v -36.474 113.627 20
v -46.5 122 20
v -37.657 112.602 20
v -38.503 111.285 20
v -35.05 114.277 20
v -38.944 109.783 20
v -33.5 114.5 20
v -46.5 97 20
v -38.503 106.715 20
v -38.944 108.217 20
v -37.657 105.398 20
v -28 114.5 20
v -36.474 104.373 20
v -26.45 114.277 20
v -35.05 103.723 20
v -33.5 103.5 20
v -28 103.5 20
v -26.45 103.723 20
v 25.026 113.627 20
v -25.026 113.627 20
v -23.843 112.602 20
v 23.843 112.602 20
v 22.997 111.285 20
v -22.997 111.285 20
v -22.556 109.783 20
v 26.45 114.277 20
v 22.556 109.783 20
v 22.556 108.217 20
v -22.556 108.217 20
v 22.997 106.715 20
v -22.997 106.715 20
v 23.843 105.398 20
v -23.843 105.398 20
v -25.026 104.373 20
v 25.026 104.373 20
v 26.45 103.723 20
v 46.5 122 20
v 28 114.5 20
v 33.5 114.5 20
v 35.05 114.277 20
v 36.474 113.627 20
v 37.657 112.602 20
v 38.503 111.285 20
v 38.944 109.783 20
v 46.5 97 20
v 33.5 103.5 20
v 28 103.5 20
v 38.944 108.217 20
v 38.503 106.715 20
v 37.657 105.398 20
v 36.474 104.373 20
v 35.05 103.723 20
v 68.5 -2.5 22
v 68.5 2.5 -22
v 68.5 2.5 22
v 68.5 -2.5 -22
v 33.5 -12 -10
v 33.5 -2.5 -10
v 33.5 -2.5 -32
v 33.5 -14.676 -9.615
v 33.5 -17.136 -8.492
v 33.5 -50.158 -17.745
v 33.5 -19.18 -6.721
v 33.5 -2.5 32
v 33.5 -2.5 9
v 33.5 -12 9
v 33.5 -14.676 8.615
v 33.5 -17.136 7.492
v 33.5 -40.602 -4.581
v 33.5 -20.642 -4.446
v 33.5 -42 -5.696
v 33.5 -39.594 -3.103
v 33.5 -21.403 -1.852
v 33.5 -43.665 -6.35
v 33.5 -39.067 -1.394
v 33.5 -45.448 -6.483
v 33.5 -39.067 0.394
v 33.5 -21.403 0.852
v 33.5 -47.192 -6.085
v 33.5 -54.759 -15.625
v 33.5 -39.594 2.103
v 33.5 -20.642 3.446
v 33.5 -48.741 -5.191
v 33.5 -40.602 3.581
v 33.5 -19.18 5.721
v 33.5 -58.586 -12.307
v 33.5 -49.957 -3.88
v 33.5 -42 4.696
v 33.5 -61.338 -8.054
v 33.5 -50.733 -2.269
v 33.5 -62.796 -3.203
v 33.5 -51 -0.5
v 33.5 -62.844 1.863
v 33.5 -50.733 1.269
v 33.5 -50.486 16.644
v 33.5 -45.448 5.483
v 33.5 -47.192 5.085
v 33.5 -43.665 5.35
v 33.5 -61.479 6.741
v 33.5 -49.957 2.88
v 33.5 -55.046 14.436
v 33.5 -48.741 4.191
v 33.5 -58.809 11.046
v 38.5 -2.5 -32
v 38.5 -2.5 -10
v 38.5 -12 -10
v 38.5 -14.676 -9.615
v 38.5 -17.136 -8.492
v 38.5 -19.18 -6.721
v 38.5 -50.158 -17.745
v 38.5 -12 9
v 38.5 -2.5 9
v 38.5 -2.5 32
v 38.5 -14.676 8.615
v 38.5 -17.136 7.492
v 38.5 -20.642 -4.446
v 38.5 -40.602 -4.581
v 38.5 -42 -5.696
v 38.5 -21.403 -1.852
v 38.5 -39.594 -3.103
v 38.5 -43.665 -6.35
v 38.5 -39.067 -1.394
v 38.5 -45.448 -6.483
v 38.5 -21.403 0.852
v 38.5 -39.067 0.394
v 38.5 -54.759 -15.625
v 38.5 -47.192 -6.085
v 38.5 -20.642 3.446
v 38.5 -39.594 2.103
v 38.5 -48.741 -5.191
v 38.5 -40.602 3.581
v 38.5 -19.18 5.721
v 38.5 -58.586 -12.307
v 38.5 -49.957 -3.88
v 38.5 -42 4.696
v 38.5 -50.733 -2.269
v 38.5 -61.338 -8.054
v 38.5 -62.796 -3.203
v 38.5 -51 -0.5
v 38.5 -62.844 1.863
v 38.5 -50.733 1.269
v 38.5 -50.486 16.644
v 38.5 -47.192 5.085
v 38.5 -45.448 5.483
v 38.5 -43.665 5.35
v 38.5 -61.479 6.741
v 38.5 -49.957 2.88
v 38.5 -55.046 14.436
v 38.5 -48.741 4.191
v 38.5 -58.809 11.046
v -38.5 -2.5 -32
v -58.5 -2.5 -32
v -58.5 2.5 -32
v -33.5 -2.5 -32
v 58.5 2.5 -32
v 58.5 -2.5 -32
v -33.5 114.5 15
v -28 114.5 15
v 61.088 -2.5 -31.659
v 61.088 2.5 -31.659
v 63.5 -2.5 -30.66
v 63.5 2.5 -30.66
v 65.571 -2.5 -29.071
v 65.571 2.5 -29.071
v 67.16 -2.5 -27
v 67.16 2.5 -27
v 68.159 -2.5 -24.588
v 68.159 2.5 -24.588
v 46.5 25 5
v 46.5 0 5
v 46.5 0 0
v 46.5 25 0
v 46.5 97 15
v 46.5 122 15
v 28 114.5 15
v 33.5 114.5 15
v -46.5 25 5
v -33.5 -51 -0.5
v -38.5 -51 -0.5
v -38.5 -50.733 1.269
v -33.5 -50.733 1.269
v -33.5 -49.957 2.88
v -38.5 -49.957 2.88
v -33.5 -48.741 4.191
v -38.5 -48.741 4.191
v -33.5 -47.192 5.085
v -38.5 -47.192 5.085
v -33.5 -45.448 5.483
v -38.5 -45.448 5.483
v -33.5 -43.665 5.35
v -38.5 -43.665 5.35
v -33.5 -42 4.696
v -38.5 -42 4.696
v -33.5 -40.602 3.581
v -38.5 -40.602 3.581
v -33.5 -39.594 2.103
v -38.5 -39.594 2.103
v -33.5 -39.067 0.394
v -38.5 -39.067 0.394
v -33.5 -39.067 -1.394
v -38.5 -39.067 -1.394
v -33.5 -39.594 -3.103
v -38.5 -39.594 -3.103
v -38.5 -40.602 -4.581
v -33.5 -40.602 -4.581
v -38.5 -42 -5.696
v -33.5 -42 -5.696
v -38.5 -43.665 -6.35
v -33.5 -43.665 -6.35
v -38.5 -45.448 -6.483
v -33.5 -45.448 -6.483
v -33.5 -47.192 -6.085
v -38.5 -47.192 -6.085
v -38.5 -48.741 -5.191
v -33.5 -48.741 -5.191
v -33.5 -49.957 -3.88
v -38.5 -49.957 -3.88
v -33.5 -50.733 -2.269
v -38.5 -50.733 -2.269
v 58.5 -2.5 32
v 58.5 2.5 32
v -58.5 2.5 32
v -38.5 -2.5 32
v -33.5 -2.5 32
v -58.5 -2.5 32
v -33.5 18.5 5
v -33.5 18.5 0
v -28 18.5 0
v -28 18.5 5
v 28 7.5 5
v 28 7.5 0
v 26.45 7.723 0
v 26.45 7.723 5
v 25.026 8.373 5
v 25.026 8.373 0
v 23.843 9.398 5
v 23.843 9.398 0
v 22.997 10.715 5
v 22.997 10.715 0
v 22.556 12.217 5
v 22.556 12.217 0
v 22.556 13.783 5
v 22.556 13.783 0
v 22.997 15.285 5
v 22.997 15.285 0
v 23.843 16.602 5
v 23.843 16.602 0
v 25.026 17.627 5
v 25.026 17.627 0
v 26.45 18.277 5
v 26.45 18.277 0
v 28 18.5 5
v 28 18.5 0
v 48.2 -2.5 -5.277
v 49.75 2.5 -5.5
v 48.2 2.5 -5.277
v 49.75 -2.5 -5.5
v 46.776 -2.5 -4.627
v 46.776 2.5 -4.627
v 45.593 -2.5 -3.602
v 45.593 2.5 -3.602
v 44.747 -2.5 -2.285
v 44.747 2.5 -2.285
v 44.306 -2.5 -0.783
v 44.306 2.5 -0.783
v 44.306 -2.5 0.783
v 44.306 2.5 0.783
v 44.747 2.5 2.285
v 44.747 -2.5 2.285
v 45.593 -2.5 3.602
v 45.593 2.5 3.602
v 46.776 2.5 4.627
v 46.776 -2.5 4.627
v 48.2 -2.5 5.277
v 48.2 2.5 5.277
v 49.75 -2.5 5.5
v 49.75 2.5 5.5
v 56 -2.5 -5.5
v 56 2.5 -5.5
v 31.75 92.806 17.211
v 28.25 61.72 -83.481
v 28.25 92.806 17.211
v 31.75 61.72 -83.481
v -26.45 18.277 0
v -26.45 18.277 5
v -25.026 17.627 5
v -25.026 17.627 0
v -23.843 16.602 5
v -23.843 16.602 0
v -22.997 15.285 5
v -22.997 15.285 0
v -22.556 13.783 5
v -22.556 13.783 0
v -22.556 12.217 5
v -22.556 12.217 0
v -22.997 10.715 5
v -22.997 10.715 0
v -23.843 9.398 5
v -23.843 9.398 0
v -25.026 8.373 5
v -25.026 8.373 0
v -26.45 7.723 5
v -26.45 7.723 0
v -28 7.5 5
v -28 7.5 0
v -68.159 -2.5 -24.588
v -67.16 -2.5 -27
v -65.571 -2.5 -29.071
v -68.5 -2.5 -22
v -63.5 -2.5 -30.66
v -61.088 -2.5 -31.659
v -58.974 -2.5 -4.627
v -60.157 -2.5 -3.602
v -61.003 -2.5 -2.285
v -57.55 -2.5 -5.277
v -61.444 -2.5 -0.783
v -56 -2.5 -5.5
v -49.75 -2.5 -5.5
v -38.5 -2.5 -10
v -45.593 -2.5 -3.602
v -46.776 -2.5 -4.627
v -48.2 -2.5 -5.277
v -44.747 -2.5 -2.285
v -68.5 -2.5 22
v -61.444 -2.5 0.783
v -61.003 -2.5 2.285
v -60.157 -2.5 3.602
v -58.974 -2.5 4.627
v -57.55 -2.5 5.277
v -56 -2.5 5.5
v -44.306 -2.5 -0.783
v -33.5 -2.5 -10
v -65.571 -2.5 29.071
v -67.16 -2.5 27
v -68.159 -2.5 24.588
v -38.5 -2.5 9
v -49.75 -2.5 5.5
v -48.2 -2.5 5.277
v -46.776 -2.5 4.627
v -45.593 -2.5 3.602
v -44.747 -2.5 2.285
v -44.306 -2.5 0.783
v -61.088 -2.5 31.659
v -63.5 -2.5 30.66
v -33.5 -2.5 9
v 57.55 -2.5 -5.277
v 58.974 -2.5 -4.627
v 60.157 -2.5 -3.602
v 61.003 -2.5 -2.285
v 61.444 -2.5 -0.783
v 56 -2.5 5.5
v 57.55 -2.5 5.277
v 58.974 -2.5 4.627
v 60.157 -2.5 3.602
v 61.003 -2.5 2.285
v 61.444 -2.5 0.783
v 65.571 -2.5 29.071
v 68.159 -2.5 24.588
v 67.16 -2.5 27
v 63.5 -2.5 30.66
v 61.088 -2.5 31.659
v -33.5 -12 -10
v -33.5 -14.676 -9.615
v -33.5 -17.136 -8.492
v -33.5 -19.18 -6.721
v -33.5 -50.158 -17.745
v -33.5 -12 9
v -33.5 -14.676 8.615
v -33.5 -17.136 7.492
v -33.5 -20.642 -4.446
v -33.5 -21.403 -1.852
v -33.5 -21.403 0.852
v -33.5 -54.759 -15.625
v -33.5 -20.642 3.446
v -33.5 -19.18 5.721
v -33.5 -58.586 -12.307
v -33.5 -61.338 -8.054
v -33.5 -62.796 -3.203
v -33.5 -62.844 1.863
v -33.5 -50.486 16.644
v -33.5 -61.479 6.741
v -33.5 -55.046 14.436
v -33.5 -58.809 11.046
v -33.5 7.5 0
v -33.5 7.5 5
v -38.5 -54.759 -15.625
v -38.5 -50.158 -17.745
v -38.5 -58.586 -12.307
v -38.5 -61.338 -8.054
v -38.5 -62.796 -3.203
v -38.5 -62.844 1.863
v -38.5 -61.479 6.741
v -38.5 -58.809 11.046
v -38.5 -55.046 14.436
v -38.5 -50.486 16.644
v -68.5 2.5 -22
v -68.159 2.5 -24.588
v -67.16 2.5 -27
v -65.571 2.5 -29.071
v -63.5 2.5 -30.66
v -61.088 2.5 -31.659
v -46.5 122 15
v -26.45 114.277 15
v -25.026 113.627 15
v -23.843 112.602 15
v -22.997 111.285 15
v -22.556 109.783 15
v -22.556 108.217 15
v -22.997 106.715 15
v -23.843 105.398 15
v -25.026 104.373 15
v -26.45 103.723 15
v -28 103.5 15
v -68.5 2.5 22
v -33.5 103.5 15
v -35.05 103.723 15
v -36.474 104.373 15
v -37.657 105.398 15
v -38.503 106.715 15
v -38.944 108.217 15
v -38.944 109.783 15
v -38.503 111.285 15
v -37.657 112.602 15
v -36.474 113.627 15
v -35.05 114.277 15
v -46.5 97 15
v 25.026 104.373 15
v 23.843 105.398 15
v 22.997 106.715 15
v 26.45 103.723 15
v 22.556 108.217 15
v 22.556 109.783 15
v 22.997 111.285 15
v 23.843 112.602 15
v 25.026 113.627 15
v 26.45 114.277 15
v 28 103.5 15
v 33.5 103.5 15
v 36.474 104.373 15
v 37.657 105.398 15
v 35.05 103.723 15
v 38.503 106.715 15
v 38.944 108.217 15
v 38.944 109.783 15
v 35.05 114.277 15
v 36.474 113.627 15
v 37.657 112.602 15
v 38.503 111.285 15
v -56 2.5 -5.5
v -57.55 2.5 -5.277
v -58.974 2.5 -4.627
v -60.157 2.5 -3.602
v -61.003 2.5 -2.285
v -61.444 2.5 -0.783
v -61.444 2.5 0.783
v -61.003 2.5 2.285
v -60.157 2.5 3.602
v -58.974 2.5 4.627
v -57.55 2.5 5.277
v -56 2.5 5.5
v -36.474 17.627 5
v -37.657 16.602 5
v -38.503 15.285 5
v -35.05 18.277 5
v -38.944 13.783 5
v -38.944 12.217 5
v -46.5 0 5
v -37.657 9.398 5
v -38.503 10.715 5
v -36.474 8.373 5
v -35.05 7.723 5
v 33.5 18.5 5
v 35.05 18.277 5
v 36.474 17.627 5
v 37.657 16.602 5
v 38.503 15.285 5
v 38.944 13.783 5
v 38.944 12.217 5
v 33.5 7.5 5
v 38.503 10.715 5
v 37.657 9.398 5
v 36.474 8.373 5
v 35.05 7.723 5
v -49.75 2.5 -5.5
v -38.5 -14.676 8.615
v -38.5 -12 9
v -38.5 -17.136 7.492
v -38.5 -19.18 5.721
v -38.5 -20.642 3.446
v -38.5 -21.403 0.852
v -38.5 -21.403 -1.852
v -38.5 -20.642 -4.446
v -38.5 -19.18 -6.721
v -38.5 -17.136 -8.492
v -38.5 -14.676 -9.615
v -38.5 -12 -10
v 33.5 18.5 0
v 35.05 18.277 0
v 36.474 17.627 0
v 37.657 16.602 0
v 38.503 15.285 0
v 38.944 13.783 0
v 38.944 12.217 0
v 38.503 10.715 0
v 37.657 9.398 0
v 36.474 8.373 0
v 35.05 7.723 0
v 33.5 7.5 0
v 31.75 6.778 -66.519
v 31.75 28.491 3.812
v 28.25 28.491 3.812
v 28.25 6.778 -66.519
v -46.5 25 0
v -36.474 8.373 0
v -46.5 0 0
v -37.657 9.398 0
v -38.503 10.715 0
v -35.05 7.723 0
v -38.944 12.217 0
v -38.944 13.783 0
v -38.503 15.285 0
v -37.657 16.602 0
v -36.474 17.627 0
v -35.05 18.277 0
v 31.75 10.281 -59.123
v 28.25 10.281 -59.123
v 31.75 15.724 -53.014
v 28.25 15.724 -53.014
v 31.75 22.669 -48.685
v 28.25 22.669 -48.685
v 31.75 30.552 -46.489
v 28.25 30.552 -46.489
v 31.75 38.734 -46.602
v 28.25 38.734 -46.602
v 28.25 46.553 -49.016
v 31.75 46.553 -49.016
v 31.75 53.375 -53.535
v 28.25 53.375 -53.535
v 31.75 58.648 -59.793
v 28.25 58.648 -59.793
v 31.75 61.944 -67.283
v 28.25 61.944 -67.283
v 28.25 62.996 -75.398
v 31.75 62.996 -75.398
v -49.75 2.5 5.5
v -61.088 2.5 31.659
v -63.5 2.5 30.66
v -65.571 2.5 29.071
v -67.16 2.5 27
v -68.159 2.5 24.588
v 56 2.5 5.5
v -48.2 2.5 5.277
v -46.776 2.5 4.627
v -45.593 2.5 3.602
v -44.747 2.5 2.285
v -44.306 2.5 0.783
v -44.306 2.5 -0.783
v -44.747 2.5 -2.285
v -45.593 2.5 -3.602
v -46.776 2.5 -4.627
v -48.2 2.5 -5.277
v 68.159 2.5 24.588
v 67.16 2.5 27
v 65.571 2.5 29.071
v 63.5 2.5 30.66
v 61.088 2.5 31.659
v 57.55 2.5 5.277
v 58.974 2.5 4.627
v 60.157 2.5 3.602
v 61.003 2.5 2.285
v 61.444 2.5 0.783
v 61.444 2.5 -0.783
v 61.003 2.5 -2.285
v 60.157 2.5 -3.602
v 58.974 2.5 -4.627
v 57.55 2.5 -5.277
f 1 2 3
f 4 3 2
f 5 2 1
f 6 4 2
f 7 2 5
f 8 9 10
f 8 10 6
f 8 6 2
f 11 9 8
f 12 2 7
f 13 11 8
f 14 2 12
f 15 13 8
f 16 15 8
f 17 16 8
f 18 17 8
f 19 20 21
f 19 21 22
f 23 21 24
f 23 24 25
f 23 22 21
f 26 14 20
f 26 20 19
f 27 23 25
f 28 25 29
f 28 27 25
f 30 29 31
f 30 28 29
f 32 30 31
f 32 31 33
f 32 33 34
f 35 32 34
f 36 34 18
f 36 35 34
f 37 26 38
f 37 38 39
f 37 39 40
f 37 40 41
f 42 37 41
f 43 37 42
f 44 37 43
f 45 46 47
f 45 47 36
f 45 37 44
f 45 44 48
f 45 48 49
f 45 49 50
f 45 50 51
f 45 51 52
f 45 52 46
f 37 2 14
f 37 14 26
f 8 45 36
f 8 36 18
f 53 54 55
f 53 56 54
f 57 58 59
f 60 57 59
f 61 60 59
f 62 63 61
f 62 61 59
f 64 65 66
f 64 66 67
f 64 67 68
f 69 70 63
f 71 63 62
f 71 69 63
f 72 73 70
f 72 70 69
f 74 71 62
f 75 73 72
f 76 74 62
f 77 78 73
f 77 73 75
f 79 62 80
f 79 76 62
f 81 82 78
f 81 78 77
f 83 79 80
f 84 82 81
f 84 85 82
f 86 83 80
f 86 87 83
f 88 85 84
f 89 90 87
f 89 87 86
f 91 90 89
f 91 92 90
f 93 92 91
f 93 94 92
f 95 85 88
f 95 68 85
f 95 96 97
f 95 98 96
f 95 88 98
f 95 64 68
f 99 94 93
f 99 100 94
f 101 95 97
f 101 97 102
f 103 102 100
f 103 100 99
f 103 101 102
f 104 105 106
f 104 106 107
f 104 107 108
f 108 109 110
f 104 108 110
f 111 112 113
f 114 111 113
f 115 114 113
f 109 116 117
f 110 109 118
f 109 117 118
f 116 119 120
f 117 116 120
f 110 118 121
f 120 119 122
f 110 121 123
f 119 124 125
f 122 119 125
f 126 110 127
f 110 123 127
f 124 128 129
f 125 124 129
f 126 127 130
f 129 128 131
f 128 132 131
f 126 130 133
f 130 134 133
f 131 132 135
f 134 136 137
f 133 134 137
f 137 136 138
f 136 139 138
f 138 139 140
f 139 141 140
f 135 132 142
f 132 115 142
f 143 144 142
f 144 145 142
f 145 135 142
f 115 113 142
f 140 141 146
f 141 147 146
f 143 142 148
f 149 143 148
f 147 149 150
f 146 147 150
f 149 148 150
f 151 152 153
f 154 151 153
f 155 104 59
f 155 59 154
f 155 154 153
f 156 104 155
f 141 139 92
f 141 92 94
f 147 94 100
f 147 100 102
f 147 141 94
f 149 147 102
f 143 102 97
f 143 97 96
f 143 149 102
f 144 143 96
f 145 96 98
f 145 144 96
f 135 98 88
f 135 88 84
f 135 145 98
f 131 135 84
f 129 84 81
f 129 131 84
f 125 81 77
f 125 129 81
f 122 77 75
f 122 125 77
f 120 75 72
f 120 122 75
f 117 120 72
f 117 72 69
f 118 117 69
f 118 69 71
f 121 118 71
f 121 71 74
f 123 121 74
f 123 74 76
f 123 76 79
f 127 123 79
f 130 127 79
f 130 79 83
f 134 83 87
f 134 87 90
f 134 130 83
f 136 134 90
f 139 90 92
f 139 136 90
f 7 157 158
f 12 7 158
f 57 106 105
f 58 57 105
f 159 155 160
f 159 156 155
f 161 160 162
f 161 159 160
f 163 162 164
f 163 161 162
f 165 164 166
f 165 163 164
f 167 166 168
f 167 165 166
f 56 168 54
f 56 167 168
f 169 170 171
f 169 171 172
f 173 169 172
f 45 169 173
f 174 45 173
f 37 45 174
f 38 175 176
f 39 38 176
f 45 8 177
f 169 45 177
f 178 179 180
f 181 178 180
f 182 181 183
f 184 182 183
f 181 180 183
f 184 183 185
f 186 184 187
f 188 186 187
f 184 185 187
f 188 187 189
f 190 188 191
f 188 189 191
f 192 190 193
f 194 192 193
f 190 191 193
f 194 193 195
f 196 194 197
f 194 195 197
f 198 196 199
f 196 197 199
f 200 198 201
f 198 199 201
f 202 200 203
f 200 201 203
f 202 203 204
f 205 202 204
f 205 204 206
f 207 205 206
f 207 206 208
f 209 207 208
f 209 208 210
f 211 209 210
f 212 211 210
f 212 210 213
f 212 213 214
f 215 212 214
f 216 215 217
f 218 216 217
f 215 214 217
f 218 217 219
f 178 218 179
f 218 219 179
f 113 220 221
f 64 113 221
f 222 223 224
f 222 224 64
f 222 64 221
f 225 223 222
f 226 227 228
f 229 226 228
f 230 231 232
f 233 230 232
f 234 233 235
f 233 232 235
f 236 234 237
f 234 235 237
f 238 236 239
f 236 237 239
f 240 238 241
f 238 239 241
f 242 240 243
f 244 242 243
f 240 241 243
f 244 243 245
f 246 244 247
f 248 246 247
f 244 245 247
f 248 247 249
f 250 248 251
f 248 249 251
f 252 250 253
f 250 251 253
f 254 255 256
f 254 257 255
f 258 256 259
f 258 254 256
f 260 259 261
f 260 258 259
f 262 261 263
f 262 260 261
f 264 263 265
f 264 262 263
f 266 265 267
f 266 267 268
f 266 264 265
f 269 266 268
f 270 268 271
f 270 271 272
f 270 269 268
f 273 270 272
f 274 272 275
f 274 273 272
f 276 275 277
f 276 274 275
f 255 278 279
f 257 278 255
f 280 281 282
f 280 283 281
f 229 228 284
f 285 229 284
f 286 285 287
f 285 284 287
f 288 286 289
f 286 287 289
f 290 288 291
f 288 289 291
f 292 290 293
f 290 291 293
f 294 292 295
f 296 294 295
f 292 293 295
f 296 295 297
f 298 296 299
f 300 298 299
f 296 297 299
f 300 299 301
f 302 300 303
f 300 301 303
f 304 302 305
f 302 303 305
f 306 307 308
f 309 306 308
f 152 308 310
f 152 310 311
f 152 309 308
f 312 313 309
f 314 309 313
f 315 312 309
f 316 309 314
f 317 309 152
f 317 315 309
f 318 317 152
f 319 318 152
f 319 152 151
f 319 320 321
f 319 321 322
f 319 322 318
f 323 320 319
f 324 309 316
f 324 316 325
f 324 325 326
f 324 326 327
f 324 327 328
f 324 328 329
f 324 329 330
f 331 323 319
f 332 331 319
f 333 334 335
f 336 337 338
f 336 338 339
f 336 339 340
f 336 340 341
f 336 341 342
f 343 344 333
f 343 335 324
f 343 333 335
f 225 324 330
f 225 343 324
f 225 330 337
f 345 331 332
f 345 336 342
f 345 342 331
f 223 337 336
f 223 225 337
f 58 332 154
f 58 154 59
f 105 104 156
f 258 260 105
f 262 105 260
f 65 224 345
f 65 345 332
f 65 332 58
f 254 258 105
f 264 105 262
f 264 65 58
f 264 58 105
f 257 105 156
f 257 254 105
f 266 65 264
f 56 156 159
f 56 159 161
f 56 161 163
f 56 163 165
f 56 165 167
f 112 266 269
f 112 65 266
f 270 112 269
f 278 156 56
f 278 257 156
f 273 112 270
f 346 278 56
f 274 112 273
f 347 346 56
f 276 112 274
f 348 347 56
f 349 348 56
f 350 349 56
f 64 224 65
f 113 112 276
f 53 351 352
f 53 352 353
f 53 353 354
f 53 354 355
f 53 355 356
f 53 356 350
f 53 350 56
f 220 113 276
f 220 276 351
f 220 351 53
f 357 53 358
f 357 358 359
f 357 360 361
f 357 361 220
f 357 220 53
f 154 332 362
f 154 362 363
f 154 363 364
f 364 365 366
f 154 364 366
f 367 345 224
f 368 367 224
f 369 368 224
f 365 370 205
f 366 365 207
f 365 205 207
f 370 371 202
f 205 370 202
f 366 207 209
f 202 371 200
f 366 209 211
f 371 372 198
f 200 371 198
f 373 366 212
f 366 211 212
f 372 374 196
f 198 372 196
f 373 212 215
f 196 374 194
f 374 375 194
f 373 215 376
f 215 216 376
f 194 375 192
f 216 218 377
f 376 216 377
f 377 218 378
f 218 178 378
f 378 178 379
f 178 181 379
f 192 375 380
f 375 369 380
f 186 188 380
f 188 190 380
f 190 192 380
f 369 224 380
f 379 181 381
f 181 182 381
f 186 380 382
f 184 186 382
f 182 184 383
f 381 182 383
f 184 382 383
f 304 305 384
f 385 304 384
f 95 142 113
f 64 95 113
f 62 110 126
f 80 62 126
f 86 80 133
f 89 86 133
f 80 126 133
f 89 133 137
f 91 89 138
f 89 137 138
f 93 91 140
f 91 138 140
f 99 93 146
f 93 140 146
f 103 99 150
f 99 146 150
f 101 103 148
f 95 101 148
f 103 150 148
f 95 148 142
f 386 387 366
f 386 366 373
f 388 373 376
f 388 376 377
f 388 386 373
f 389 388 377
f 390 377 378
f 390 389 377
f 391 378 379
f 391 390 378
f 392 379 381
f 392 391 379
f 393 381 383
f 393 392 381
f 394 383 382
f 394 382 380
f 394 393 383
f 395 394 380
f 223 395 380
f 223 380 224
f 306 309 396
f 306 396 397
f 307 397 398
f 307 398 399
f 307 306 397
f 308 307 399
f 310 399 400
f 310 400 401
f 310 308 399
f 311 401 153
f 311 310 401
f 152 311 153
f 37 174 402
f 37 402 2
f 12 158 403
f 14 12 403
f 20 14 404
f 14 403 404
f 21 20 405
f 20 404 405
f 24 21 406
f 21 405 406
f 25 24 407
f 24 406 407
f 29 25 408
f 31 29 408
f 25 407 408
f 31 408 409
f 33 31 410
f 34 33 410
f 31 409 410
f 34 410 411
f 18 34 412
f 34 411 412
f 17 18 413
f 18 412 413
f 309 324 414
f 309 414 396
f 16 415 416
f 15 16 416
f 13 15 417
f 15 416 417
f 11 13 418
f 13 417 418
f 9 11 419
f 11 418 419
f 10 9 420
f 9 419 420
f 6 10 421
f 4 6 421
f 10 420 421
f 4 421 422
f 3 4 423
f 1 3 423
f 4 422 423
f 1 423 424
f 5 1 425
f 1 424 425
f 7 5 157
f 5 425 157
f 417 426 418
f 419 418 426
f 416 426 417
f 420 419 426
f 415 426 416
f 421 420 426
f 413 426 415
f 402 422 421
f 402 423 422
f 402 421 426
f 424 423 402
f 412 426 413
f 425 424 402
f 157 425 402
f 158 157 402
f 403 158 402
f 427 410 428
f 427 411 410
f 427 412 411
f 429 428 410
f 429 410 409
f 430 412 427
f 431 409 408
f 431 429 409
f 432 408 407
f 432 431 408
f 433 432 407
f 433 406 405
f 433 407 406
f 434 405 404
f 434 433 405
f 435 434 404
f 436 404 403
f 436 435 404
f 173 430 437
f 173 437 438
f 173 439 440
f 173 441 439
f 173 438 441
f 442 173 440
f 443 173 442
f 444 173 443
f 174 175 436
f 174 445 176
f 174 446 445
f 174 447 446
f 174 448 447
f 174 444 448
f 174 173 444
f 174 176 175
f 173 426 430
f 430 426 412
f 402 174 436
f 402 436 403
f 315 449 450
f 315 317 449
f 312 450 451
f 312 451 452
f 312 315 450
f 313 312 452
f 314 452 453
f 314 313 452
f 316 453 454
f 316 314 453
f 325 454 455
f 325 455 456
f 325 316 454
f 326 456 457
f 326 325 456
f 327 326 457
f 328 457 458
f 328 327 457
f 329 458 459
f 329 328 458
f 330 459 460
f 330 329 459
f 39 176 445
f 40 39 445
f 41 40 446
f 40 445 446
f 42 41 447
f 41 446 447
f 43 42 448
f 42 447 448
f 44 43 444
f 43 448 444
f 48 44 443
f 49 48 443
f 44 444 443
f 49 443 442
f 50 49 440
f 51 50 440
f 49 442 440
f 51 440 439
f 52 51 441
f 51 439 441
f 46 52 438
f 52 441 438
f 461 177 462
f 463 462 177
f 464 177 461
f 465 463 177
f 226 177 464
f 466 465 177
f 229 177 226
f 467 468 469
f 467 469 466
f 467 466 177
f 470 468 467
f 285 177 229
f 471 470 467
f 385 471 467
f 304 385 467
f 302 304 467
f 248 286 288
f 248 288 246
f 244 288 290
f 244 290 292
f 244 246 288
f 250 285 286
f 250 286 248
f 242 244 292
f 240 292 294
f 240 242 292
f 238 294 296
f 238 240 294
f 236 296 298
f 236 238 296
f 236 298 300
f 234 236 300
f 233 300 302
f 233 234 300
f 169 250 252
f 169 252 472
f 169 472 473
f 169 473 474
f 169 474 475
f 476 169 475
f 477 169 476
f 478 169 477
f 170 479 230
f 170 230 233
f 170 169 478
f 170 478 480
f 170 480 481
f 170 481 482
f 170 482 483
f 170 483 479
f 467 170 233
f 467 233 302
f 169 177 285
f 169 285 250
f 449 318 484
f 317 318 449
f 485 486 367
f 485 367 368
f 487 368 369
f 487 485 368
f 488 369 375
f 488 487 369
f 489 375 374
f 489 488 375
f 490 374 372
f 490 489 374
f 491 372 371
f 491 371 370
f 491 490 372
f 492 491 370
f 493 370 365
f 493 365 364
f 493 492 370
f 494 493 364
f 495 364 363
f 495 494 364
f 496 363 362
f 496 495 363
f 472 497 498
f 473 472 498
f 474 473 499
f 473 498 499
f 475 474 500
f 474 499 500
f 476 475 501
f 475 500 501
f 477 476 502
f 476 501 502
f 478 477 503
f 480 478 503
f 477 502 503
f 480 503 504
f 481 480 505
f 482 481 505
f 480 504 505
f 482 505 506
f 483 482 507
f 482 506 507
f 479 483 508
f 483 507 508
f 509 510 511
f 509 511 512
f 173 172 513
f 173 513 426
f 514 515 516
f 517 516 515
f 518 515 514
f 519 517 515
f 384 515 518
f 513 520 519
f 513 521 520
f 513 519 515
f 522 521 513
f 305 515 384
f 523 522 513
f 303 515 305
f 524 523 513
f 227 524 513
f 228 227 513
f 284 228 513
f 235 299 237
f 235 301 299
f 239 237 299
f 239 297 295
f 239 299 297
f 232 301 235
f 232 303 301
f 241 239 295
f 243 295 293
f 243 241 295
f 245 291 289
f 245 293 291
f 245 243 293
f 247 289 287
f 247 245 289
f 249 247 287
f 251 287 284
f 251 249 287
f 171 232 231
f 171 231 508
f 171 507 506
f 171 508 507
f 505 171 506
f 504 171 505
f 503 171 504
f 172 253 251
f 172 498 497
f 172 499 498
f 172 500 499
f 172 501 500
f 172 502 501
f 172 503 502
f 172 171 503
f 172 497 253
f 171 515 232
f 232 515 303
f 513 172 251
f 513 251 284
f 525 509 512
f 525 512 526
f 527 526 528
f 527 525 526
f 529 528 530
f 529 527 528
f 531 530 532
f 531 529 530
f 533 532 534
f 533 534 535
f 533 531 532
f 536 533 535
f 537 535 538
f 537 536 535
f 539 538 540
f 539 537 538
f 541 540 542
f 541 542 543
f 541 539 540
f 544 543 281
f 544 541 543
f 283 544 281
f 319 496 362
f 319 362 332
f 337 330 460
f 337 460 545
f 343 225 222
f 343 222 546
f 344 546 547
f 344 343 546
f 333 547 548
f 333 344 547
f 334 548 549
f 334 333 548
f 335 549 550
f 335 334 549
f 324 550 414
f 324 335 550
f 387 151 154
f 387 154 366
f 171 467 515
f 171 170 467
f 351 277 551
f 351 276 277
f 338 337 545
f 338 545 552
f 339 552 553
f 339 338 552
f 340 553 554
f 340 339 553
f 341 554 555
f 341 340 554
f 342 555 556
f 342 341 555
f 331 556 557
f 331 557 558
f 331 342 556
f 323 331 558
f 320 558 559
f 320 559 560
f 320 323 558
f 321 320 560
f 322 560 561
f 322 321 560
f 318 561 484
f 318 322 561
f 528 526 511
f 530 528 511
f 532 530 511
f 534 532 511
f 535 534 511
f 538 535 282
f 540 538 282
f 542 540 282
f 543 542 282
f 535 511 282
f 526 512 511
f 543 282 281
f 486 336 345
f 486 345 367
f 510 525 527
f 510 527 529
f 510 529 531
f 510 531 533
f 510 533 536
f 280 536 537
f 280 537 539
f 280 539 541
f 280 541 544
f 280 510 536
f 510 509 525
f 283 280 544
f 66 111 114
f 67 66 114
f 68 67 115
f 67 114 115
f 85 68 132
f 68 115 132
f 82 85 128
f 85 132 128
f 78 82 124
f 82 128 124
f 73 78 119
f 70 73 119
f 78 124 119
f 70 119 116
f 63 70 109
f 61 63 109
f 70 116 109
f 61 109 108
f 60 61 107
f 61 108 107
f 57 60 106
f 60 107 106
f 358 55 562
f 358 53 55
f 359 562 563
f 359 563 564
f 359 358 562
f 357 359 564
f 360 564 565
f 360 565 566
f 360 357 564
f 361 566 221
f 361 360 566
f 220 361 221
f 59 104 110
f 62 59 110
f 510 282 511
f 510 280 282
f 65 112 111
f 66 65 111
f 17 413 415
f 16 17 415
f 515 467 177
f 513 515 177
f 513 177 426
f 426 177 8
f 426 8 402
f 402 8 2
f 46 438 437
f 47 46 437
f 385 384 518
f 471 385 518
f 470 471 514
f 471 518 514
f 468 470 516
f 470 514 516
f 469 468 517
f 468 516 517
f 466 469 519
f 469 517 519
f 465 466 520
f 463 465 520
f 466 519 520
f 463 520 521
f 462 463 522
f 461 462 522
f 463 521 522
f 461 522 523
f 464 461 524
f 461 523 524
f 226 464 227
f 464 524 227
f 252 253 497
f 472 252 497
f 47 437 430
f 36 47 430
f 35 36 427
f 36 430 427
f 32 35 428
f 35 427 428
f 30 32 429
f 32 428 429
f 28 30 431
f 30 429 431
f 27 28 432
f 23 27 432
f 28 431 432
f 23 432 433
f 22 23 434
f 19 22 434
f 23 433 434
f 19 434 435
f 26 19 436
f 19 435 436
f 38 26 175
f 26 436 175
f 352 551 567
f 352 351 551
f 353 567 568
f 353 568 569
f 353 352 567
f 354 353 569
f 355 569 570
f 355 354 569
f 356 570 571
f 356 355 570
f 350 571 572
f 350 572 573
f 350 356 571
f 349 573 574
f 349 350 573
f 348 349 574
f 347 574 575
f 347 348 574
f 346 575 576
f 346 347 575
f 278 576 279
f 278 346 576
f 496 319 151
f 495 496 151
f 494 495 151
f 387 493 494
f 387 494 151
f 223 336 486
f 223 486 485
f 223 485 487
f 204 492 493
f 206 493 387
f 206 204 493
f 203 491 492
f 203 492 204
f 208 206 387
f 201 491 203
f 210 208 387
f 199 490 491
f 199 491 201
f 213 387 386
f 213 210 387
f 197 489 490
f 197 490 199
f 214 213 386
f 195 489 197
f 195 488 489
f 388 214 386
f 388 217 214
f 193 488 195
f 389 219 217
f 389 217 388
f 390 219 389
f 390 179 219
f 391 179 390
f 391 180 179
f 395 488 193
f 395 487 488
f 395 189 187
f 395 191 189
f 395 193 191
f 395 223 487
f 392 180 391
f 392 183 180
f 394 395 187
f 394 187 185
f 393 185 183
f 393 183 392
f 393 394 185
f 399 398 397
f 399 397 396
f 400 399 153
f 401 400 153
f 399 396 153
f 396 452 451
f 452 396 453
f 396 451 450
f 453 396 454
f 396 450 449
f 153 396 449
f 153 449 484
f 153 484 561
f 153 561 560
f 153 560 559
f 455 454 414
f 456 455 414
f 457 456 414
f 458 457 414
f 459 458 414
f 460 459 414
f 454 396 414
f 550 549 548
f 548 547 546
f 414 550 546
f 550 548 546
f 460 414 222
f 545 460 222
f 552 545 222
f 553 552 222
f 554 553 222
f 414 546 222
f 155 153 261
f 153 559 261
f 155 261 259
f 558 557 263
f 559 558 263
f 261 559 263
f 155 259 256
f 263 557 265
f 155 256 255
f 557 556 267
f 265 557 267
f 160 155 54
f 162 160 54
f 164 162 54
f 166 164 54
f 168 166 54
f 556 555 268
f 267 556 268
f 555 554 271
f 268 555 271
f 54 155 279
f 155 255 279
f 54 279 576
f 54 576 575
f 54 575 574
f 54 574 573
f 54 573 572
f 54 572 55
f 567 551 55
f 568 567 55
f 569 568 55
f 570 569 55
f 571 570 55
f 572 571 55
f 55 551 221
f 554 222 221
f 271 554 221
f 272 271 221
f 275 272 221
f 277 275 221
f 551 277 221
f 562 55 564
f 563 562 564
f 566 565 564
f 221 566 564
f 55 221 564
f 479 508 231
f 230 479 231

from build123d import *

# Parameters (mm, degrees)
F1_DEPTH  = 2.5
F3_R      = 6
F4_DEPTH  = 5
F7_DEPTH  = 46.5
F9_DEPTH  = 25
F11_DEPTH = 1.75


with BuildPart() as f1:
    # F0 (on Front) → F1 (new body, symmetric)
    with BuildSketch(Plane.XZ):
        with BuildLine():
            ThreePointArc((68.5, 22), (65.571068, 29.071068), (58.5, 32))
            Line((58.5, 32), (-58.5, 32))
            ThreePointArc((-58.5, 32), (-65.571068, 29.071068), (-68.5, 22))
            Line((-68.5, 22), (-68.5, -22))
            ThreePointArc((-68.5, -22), (-65.571068, -29.071068), (-58.5, -32))
            Line((-58.5, -32), (58.5, -32))
            ThreePointArc((58.5, -32), (65.571068, -29.071068), (68.5, -22))
            Line((68.5, -22), (68.5, 22))
        make_face()
        with BuildLine():
            Line((-55.999996, 5.5), (-49.749996, 5.5))
            ThreePointArc((-49.749996, 5.5), (-44.249996, 0), (-49.749996, -5.5))
            Line((-49.749996, -5.5), (-56, -5.5))
            ThreePointArc((-56, -5.5), (-61.5, 2e-06), (-55.999996, 5.5))
        make_face(mode=Mode.SUBTRACT)
        with BuildLine():
            Line((56, -5.5), (49.749996, -5.5))
            ThreePointArc((49.749996, -5.5), (44.249996, 0), (49.749996, 5.5))
            Line((49.749996, 5.5), (55.999996, 5.5))
            ThreePointArc((55.999996, 5.5), (61.5, 2e-06), (56, -5.5))
        make_face(mode=Mode.SUBTRACT)
    extrude(amount=F1_DEPTH, both=True)

    # F3 (on offset) → F4 (join)
    with BuildSketch(Plane(origin=(-38.5, 0, 0), x_dir=(0, -1, 0), z_dir=(-1, 0, 0))):
        with BuildLine():
            Line((50.486241, 16.643546), (2.5, 32))
            Line((2.5, 32), (2.5, 9))
            Line((2.5, 9), (12, 9))
            ThreePointArc((12, 9), (21.5, -0.5), (12, -10))
            Line((12, -10), (2.5, -10))
            Line((2.5, -10), (2.5, -32))
            Line((2.5, -32), (50.158136, -17.745105))
            ThreePointArc((50.158136, -17.745105), (62.999181, -0.671731), (50.486241, 16.643546))
        make_face()
        with Locations((45, -0.5)):
            Circle(F3_R, mode=Mode.SUBTRACT)
    extrude(amount=-F4_DEPTH)

    # F5: F1 across plane


with BuildPart() as f1_1:
    add(f1.part)
    add(f1.part.mirror(Plane.YZ))


with BuildPart() as f7:
    # F6 (on Right) → F7 (new body, symmetric)
    with BuildSketch(Plane.YZ):
        Polygon((0, 5), (0, 0), (25, 0), (97, 15), (122, 15), (122, 20), (97, 20), (25, 5), align=None)
    extrude(amount=F7_DEPTH, both=True)

    # F8 (on face) → F9 (cut)
    with BuildSketch(Plane(origin=(0, 0, 0), x_dir=(1, 0, 0), z_dir=(0, 0, -1))):
        with BuildLine():
            ThreePointArc((28, -103.5), (22.5, -109), (28, -114.5))
            Line((28, -114.5), (33.5, -114.5))
            ThreePointArc((33.5, -114.5), (39, -109), (33.5, -103.5))
            Line((33.5, -103.5), (28, -103.5))
        make_face()
        with BuildLine():
            ThreePointArc((-28, -114.5), (-22.5, -109), (-28, -103.5))
            Line((-28, -103.5), (-33.5, -103.5))
            ThreePointArc((-33.5, -103.5), (-39, -109), (-33.5, -114.5))
            Line((-33.5, -114.5), (-28, -114.5))
        make_face()
        with BuildLine():
            ThreePointArc((28, -7.5), (22.5, -13), (28, -18.5))
            Line((28, -18.5), (33.5, -18.5))
            ThreePointArc((33.5, -18.5), (39, -13), (33.5, -7.5))
            Line((33.5, -7.5), (28, -7.5))
        make_face()
        with BuildLine():
            ThreePointArc((-28, -18.5), (-22.5, -13), (-28, -7.5))
            Line((-28, -7.5), (-33.5, -7.5))
            ThreePointArc((-33.5, -7.5), (-39, -13), (-33.5, -18.5))
            Line((-33.5, -18.5), (-28, -18.5))
        make_face()
    extrude(amount=-F9_DEPTH, mode=Mode.SUBTRACT)


with BuildPart() as f11:
    # F10 (on Right) → F11 (new body, symmetric)
    with BuildSketch(Plane.YZ):
        with BuildLine():
            Line((92.805771, 17.211208), (28.491435, 3.812388))
            Line((28.491435, 3.812388), (6.778453, -66.519165))
            ThreePointArc((6.778453, -66.519165), (42.729962, -47.529326), (61.719801, -83.480835))
            Line((61.719801, -83.480835), (92.805771, 17.211208))
        make_face()
    extrude(amount=F11_DEPTH, both=True)


with BuildPart() as f11_1:
    # F12: moved
    add(f11.part.moved(Location((30, 0, 0))))


solid = Compound([f1_1.part, f7.part, f11_1.part])
